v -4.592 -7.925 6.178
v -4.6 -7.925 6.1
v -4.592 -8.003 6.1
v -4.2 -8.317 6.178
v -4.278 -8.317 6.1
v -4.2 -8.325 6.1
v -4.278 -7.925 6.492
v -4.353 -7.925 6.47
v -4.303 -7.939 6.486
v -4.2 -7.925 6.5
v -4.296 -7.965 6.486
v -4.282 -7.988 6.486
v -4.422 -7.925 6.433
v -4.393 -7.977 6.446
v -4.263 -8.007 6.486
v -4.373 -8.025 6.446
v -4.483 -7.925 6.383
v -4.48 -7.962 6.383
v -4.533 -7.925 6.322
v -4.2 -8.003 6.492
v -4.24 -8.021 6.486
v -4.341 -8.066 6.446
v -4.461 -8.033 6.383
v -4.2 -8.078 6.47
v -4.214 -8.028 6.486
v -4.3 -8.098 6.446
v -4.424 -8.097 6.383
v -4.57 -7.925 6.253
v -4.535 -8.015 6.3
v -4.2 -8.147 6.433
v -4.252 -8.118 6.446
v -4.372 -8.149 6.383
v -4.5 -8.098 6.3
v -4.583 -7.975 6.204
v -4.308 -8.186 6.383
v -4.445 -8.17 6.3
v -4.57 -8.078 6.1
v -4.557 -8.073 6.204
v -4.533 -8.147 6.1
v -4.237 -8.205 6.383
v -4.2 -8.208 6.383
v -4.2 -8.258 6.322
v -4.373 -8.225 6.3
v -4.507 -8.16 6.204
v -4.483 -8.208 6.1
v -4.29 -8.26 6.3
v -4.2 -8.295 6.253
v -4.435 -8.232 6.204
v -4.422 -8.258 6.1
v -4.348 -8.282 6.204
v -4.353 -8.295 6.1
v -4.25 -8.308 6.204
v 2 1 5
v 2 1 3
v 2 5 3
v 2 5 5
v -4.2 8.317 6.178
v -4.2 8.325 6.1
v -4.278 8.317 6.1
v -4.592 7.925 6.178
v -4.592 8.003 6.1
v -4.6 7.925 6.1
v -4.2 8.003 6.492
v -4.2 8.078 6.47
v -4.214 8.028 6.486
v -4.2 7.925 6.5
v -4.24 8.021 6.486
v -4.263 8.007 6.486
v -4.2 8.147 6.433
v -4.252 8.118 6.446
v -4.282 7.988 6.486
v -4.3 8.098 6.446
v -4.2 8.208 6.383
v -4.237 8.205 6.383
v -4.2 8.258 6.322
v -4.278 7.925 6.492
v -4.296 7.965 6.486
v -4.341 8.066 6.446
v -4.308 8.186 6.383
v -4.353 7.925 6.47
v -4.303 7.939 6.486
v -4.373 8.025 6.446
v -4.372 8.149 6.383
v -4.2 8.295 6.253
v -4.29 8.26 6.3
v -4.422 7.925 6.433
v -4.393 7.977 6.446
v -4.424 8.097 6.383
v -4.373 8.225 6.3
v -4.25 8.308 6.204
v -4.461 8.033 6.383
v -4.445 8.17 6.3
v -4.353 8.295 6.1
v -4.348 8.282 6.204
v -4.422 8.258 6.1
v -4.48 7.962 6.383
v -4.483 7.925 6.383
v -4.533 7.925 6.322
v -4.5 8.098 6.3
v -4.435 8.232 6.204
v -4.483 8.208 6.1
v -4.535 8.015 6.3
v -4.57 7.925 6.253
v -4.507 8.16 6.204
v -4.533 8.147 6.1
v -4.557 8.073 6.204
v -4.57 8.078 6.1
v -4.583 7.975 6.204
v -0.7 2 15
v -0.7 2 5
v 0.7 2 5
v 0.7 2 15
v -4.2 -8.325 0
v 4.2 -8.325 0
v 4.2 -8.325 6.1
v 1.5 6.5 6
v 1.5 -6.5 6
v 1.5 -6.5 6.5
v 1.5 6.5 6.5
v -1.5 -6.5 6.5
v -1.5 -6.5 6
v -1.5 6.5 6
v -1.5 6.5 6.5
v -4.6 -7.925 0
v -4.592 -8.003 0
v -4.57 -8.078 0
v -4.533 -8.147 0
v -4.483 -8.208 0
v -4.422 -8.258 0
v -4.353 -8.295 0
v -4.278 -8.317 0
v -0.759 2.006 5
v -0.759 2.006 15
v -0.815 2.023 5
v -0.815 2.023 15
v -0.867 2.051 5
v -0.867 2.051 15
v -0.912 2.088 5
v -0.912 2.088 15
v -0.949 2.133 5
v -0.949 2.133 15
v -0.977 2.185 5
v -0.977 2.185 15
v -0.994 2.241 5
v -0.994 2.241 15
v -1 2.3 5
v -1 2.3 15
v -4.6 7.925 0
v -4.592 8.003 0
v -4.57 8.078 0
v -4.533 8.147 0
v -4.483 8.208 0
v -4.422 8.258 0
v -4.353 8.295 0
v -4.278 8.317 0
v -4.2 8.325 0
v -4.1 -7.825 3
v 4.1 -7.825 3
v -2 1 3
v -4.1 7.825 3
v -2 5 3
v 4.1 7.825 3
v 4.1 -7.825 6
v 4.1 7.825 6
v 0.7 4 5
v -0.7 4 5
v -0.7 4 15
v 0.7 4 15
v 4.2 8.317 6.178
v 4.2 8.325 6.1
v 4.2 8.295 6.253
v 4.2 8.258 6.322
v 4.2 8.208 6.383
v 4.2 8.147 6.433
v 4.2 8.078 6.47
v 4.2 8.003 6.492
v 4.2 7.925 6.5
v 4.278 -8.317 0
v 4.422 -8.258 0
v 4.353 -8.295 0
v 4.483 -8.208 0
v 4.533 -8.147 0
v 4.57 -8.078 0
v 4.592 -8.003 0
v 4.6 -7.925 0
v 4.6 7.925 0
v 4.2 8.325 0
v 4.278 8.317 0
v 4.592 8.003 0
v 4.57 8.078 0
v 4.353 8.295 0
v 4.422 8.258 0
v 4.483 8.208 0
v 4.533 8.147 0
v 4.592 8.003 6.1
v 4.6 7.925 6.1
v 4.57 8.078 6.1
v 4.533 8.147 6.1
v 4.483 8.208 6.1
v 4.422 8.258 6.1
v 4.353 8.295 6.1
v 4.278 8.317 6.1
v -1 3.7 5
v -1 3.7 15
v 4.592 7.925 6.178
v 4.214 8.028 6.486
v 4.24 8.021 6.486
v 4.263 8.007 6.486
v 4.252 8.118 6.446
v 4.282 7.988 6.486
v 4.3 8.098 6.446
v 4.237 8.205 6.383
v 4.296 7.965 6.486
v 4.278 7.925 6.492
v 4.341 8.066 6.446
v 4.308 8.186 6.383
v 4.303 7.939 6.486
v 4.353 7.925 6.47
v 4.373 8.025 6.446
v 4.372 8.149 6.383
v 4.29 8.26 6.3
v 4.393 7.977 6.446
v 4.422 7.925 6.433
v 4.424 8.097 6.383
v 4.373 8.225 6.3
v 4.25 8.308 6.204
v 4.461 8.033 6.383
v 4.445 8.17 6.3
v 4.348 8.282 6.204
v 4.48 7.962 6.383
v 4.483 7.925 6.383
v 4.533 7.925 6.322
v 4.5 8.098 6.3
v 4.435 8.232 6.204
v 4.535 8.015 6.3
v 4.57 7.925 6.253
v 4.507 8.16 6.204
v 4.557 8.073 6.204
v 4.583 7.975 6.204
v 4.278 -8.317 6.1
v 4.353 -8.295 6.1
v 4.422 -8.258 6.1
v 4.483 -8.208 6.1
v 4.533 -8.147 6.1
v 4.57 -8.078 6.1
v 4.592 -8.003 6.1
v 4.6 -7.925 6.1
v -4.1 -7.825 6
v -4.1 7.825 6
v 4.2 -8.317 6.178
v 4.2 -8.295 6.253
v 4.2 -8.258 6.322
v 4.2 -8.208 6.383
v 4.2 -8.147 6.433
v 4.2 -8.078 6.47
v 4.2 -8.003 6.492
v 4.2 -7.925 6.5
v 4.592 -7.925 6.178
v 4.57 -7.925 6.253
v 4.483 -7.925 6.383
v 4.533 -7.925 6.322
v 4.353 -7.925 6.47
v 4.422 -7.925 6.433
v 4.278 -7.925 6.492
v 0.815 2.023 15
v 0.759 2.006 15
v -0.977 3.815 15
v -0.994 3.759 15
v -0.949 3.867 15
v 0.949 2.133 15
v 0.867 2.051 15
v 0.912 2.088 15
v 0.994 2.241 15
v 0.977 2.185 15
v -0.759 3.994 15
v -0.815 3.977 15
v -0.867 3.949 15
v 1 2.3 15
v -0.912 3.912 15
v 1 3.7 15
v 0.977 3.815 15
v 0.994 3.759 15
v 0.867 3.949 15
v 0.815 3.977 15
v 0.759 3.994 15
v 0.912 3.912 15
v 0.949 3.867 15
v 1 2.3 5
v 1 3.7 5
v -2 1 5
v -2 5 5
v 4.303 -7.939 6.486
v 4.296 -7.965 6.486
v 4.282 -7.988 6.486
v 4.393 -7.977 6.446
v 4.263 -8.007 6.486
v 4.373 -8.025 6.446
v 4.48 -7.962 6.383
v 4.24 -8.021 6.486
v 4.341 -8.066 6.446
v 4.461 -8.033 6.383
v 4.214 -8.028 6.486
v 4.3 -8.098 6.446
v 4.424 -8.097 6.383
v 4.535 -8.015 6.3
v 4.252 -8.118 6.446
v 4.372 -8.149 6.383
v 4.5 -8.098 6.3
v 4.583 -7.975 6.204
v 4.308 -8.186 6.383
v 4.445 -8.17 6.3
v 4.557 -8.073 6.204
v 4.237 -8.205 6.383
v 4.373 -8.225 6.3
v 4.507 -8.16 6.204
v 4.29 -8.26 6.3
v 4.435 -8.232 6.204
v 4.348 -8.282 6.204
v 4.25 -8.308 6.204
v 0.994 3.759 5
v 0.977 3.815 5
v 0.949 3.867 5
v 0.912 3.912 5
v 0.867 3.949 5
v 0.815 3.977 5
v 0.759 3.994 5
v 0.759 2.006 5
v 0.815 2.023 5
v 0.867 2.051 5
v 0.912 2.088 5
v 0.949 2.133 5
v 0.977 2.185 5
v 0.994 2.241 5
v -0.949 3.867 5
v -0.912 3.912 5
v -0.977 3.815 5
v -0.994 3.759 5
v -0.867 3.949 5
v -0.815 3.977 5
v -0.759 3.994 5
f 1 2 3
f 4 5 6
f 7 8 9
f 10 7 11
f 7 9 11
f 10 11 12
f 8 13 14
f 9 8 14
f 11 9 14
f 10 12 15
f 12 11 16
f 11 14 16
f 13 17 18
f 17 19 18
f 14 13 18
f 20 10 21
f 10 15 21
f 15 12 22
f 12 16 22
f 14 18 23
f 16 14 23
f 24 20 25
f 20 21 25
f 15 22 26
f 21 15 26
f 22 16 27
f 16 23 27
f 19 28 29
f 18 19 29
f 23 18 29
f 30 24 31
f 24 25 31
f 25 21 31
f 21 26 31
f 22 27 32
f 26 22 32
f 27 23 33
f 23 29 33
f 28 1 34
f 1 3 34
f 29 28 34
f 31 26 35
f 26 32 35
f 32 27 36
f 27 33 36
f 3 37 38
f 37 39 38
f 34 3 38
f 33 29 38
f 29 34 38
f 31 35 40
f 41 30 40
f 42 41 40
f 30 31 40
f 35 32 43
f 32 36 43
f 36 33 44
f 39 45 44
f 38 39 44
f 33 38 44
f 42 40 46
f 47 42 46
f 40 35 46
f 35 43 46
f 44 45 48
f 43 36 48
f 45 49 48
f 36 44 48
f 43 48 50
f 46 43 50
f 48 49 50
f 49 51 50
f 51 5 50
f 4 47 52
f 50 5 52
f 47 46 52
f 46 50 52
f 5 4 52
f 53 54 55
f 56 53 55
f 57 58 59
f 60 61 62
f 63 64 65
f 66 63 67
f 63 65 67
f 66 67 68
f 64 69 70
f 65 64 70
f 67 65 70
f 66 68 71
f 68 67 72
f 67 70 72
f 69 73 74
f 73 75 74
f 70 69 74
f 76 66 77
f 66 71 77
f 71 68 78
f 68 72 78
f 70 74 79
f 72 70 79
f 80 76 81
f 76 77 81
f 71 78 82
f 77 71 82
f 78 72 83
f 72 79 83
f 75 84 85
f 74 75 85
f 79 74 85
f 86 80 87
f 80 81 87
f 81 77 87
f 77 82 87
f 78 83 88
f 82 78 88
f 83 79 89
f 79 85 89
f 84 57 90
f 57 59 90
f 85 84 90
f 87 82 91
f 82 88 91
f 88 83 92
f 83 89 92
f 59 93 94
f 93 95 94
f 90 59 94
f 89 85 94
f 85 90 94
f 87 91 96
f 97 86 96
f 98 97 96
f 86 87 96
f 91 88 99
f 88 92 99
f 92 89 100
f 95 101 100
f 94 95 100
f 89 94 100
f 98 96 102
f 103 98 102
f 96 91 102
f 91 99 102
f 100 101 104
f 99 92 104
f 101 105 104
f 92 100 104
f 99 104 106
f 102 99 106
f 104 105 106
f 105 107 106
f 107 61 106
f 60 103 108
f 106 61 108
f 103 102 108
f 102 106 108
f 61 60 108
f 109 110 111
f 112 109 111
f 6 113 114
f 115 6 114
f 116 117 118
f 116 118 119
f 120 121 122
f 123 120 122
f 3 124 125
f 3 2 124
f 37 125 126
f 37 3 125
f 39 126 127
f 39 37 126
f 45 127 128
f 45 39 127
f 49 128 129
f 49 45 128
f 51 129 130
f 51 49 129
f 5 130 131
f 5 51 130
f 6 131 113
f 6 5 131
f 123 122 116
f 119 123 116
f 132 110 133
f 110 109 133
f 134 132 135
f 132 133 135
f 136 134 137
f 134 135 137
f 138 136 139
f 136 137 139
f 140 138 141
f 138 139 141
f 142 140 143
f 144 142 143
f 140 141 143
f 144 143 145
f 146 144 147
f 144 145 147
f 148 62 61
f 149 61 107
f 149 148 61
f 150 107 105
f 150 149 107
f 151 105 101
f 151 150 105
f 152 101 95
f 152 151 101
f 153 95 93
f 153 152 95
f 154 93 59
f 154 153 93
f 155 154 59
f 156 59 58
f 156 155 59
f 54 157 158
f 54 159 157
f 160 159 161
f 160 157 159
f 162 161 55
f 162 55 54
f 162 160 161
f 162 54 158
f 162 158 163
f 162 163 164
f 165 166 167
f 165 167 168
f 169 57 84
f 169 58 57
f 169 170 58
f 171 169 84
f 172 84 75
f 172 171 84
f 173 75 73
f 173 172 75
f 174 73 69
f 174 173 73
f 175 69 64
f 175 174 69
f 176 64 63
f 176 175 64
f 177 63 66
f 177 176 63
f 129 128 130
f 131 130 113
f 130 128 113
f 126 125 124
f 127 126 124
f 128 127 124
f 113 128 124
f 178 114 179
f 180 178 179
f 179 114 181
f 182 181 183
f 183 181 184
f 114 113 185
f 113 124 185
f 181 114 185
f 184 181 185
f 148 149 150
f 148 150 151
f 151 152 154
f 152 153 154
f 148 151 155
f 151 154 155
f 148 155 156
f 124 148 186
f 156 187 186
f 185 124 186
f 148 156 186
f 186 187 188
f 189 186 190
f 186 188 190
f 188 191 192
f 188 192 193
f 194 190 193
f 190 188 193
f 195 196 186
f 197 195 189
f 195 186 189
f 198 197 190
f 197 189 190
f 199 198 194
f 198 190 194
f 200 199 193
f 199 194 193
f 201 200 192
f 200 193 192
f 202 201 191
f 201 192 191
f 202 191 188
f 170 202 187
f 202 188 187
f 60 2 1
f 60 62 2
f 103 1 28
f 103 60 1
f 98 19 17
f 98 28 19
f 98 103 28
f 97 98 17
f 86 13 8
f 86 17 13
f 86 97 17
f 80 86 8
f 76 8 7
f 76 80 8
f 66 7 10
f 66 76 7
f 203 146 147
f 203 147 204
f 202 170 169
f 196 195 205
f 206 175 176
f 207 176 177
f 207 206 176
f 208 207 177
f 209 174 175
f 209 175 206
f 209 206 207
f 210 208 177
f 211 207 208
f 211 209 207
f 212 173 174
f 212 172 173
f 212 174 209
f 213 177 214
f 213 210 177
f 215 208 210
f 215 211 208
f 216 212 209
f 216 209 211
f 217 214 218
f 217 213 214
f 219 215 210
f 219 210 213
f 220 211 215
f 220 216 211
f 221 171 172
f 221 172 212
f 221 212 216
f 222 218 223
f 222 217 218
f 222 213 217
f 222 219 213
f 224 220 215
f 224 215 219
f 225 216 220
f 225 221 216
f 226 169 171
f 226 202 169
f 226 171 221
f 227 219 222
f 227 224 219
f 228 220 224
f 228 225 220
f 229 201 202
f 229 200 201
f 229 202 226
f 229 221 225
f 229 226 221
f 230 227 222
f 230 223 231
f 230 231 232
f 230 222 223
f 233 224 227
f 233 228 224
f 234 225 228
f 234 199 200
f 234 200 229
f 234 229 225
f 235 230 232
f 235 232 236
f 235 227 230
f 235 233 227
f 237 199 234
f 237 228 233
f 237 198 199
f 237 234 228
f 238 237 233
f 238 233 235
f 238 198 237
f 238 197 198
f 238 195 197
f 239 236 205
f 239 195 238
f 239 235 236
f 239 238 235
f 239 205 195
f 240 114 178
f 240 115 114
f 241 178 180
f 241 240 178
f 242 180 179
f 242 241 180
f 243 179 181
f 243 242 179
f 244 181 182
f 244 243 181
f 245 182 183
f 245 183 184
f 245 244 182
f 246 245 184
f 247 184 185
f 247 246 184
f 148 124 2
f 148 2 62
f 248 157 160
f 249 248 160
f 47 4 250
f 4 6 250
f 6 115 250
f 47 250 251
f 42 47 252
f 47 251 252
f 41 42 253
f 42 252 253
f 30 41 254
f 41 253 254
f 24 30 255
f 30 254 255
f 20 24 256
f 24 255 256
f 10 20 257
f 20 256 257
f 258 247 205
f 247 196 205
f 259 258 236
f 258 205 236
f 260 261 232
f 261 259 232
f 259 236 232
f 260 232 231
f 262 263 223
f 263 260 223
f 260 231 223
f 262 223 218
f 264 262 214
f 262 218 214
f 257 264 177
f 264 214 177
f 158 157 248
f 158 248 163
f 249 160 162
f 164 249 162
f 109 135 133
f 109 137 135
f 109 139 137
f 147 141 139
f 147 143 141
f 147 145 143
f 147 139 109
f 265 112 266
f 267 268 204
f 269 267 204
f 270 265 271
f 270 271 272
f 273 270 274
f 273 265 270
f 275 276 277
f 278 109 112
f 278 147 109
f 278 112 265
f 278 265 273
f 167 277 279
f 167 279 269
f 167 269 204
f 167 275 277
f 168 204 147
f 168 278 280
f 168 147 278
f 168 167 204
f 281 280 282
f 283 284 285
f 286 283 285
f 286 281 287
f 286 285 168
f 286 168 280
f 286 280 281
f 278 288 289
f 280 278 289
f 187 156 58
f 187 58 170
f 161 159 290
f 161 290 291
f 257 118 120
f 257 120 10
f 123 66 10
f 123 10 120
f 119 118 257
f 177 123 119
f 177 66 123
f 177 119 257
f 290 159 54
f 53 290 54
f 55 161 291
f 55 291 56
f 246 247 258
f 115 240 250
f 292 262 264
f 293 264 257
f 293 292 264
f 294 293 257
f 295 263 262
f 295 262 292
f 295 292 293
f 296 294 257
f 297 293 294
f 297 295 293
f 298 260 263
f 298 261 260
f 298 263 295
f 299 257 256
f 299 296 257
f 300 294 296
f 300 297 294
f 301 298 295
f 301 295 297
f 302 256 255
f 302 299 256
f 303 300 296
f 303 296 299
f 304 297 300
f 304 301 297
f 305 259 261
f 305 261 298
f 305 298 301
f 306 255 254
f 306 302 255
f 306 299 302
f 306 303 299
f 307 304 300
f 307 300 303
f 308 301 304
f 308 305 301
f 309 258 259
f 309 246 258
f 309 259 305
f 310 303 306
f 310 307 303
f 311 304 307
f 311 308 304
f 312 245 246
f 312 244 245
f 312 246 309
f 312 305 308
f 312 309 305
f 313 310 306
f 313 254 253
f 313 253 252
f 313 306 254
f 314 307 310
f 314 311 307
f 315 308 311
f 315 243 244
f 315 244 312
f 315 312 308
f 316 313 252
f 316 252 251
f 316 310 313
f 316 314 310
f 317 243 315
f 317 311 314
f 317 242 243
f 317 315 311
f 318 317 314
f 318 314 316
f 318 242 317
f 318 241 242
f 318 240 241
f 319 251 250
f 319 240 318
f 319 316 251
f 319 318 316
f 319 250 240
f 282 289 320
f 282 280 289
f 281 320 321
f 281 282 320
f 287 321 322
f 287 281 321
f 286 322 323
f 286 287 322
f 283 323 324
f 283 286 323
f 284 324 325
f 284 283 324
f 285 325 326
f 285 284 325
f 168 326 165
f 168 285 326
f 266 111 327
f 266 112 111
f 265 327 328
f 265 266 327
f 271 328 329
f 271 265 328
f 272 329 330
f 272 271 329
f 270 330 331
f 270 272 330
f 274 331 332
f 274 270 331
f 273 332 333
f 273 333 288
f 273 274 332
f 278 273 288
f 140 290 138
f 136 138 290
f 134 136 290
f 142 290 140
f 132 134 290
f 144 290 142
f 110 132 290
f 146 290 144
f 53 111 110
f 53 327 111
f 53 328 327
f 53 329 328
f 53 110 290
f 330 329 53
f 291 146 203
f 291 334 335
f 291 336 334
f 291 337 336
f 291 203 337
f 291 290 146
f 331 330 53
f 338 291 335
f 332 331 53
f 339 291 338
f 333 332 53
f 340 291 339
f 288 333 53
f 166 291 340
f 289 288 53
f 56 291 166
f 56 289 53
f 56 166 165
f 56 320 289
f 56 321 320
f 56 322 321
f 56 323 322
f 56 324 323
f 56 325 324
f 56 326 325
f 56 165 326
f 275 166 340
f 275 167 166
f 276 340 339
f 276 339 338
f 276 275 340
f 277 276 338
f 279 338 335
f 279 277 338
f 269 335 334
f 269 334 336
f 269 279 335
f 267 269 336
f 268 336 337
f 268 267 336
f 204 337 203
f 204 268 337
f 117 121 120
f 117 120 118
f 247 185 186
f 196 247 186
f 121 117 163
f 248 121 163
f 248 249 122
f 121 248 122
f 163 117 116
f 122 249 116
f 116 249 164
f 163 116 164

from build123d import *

# Parameters (mm, degrees)
SKETCH_W      = 9.2
SKETCH_H      = 16.65
PAD_DEPTH     = 3
SKETCH001_W   = 9.2
SKETCH001_H   = 16.65
SKETCH001_W_2 = 8.2
SKETCH001_H_2 = 15.65
PAD001_DEPTH  = 3
SKETCH002_W   = 9.2
SKETCH002_H   = 16.65
SKETCH002_W_2 = 3
SKETCH002_H_2 = 13
PAD002_DEPTH  = 0.5
FILLET_R      = 0.4
SKETCH003_W   = 4
SKETCH003_H   = 4
PAD003_DEPTH  = 2
SKETCH004_W   = 2
SKETCH004_H   = 2
PAD004_DEPTH  = 10
FILLET001_R   = 0.3


with BuildPart() as part:
    # Sketch → Pad (new body)
    with BuildSketch(Plane.XY):
        Rectangle(SKETCH_W, SKETCH_H)
    extrude(amount=PAD_DEPTH)

    # Sketch001 (on Face6 of Pad) → Pad001 (join)
    with BuildSketch(Plane.XY.offset(3)):
        Rectangle(SKETCH001_W, SKETCH001_H)
        Rectangle(SKETCH001_W_2, SKETCH001_H_2, mode=Mode.SUBTRACT)
    extrude(amount=PAD001_DEPTH)

    # Sketch002 (on Face9 of Pad001) → Pad002 (join)
    with BuildSketch(Plane.XY.offset(6)):
        Rectangle(SKETCH002_W, SKETCH002_H)
        Rectangle(SKETCH002_W_2, SKETCH002_H_2, mode=Mode.SUBTRACT)
    extrude(amount=PAD002_DEPTH)

    # Fillet
    fillet_edges = [part.edges().sort_by_distance(p)[0] for p in [
        (4.6, -8.325, 1.5),
        (-4.6, -8.325, 1.5),
        (-4.6, 8.325, 1.5),
        (4.6, 8.325, 1.5),
        (0, 8.325, 6.5),
        (4.6, 0, 6.5),
        (-4.6, 0, 6.5),
        (0, -8.325, 6.5),
    ]]
    fillet(fillet_edges, radius=FILLET_R)

    # Sketch003 (on Face44 of Fillet) → Pad003 (join)
    with BuildSketch(Plane.XY.offset(3)):
        with Locations((0, 3)):
            Rectangle(SKETCH003_W, SKETCH003_H)
    extrude(amount=PAD003_DEPTH)

    # Sketch004 (on Face49 of Pad003) → Pad004 (join)
    with BuildSketch(Plane.XY.offset(5)):
        with Locations((0, 3)):
            Rectangle(SKETCH004_W, SKETCH004_H)
    extrude(amount=PAD004_DEPTH)

    # Fillet001
    fillet001_edges = [part.edges().sort_by_distance(p)[0] for p in [
        (-1, 4, 10),
        (-1, 2, 10),
        (1, 4, 10),
        (1, 2, 10),
    ]]
    fillet(fillet001_edges, radius=FILLET001_R)


solid = part.part
